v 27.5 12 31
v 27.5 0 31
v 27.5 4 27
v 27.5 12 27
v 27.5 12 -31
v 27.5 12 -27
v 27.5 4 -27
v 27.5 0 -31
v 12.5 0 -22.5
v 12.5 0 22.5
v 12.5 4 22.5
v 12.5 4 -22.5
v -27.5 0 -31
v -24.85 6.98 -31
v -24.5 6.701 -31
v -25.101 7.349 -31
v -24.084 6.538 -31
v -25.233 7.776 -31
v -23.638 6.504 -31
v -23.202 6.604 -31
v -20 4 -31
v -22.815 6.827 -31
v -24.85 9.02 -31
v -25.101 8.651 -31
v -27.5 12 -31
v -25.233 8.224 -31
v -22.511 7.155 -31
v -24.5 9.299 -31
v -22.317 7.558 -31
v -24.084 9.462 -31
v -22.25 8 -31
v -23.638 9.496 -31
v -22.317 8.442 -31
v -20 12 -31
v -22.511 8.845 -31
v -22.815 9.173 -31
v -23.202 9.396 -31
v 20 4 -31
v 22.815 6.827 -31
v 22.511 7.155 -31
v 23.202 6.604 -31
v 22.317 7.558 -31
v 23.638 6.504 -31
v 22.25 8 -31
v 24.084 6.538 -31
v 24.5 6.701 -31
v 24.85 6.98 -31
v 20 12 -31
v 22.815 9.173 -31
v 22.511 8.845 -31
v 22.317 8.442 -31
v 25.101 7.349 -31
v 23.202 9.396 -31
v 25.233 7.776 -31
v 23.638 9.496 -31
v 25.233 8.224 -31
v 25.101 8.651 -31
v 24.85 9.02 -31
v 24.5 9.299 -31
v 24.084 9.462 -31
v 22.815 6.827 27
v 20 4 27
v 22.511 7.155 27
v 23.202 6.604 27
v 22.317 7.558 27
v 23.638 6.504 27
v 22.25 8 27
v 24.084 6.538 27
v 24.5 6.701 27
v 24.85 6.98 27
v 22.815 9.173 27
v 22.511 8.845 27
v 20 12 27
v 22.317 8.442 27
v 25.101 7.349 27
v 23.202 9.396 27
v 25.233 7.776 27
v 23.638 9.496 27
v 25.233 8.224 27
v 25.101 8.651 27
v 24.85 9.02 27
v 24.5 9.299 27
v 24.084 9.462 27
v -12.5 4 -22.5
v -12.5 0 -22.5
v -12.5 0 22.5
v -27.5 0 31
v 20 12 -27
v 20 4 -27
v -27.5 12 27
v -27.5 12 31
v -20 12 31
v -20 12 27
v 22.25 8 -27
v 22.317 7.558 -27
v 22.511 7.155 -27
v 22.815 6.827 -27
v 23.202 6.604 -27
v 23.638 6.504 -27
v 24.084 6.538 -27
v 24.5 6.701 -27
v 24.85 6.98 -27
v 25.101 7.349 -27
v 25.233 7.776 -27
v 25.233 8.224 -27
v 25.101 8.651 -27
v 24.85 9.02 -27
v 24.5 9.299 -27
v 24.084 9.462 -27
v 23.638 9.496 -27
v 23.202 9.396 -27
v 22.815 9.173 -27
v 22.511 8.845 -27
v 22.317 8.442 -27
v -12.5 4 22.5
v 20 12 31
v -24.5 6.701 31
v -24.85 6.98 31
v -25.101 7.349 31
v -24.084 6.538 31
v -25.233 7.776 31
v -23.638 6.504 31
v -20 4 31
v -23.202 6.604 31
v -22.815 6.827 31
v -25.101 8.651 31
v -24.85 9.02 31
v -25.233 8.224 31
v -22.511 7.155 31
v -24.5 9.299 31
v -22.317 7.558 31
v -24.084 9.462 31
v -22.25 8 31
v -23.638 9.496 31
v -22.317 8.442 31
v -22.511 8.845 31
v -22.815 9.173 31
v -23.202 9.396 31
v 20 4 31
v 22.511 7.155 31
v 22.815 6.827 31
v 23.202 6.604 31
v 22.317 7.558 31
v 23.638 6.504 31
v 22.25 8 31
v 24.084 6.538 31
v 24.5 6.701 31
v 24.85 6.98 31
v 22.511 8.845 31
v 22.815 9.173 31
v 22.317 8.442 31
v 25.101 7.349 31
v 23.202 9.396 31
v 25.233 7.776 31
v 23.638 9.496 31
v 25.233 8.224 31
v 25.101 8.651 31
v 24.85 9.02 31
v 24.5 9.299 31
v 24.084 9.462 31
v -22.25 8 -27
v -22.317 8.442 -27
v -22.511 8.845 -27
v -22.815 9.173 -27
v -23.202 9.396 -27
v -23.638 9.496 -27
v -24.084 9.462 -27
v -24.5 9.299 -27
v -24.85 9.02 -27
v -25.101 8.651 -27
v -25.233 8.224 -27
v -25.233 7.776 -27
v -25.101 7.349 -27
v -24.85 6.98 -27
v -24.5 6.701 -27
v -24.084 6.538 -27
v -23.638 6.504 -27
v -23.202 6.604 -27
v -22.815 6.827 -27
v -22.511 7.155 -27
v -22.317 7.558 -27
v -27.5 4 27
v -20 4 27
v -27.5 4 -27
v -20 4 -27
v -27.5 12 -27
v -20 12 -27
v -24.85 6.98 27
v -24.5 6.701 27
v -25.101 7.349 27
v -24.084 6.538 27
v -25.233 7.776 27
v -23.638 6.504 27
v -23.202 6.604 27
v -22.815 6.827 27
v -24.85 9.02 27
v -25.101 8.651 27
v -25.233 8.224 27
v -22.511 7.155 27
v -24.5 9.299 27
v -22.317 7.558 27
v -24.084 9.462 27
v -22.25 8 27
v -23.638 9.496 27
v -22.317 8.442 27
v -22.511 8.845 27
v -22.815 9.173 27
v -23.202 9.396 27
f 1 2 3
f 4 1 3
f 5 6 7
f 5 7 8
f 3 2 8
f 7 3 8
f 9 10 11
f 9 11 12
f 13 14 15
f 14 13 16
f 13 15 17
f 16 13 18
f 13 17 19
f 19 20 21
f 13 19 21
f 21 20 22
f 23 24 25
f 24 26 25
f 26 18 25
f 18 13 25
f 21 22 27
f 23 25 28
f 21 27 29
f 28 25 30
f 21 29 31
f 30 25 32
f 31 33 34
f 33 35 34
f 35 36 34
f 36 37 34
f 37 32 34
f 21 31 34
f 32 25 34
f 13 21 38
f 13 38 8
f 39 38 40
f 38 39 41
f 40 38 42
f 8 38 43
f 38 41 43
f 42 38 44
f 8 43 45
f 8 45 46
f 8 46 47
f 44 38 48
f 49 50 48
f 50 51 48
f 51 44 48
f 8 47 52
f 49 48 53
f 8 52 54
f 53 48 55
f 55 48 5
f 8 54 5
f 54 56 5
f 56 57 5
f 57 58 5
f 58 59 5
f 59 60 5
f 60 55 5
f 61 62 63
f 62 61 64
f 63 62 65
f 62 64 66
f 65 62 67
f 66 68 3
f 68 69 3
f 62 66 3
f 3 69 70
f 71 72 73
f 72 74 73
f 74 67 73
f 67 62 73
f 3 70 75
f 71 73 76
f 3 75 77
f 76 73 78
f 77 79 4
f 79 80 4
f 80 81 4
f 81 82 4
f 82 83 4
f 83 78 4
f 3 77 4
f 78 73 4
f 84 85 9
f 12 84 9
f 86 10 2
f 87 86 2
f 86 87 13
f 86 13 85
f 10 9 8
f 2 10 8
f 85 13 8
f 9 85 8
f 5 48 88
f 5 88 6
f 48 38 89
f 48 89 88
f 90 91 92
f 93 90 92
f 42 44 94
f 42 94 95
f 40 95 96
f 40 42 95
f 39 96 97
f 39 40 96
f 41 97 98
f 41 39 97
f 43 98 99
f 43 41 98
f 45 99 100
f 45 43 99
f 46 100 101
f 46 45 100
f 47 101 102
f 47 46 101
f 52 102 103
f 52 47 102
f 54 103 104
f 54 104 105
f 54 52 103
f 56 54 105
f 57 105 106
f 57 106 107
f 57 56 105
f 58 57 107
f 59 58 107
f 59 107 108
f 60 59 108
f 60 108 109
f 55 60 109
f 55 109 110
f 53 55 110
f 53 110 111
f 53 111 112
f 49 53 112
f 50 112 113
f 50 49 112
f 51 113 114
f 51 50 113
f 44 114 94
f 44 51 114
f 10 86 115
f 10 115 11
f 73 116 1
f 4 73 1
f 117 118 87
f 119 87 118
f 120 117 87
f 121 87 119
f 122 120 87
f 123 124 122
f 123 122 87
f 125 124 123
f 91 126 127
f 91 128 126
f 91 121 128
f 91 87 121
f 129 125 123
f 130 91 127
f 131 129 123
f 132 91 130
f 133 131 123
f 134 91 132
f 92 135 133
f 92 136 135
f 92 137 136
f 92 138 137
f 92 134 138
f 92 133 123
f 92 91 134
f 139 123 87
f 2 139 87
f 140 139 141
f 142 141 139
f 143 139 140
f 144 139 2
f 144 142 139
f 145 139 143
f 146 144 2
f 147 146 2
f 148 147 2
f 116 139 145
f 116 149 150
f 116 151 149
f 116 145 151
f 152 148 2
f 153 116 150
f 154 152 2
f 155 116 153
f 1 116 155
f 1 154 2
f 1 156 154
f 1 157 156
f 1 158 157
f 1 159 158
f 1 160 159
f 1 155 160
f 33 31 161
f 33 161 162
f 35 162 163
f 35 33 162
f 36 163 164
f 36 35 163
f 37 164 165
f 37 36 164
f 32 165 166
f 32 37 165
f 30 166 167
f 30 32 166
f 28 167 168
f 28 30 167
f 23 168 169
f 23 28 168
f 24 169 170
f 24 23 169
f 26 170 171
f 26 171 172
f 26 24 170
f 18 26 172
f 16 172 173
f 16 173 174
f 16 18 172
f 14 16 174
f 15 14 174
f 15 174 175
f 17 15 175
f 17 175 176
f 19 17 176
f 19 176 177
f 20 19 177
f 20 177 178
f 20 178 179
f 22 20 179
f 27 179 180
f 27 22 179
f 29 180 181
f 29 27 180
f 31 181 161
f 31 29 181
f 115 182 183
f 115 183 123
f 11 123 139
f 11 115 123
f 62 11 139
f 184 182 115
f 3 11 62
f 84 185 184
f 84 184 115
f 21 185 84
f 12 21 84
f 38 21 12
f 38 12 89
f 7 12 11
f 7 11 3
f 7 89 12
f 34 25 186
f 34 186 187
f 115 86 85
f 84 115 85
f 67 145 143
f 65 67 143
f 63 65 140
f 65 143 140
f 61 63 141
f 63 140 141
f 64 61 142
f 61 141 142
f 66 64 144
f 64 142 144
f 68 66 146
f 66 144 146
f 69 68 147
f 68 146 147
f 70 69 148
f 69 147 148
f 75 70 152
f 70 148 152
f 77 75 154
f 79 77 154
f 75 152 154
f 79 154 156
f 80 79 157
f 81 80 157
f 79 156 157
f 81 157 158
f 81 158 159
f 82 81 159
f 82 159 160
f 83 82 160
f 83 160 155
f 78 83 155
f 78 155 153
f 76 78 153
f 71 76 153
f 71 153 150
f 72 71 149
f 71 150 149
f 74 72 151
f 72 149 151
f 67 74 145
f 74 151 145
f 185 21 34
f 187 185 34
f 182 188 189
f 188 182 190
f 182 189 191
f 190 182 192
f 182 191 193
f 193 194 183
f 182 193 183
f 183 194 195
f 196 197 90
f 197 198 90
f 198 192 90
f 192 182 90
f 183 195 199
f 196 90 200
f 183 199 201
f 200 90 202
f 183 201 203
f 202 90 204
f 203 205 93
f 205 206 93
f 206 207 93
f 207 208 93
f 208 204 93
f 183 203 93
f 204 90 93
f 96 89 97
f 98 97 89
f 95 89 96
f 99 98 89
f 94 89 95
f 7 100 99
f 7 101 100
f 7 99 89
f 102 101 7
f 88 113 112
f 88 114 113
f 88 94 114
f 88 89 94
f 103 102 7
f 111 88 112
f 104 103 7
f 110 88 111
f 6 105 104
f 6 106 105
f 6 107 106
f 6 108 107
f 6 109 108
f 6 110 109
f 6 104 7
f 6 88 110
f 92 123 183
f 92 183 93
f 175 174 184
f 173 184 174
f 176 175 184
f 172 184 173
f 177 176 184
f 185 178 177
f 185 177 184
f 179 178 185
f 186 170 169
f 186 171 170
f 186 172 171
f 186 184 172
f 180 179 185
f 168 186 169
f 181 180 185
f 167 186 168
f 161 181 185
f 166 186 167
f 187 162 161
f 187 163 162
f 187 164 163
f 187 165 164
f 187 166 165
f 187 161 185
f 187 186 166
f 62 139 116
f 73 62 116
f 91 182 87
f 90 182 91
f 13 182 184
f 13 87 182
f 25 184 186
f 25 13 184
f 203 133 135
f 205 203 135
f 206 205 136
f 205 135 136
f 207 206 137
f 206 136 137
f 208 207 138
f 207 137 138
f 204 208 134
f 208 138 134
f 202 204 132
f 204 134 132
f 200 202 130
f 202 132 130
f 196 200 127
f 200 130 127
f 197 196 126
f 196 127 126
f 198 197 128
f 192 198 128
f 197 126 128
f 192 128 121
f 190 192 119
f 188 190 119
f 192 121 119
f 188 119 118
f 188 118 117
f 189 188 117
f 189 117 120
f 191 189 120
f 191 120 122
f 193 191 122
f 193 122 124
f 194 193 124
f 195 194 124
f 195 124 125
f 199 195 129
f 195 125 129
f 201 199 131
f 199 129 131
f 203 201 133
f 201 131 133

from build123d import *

# Parameters (mm, degrees)
SKETCH1_W           = 55
SKETCH1_H           = 62
SKETCH1_W_2         = 25
SKETCH1_H_2         = 45
BOSS_EXTRUDE1_DEPTH = 4
SKETCH2_W           = 7.5
SKETCH2_H           = 8
SKETCH2_R           = 1.5
BOSS_EXTRUDE2_DEPTH = 4


with BuildPart() as part:
    # Sketch1 → Boss-Extrude1 (new body)
    with BuildSketch(Plane(origin=(0, 0, 0), x_dir=(1, 0, 0), z_dir=(0, 1, 0))):
        Rectangle(SKETCH1_W, SKETCH1_H)
        Rectangle(SKETCH1_W_2, SKETCH1_H_2, mode=Mode.SUBTRACT)
    extrude(amount=BOSS_EXTRUDE1_DEPTH)

    # Sketch2 → Boss-Extrude2 (add)
    # profile 1 of 2: a face of its own
    with BuildSketch(Plane.XY.offset(31)):
        with Locations((-23.75, 8)):
            Rectangle(SKETCH2_W, SKETCH2_H)
        with Locations((-23.75, 8)):
            Circle(SKETCH2_R, mode=Mode.SUBTRACT)
    # profile 2 of 2: a face of its own
    with BuildSketch(Plane.XY.offset(31)):
        with Locations((23.75, 8)):
            Rectangle(SKETCH2_W, SKETCH2_H)
        with Locations(Location((23.75, 8, 0), (0, 0, 180))):
            Circle(SKETCH2_R, mode=Mode.SUBTRACT)
    boss_extrude2 = extrude(amount=-BOSS_EXTRUDE2_DEPTH)

    # Mirror1: Boss-Extrude2 across plane
    add(boss_extrude2.mirror(Plane.XY))


solid = part.part
